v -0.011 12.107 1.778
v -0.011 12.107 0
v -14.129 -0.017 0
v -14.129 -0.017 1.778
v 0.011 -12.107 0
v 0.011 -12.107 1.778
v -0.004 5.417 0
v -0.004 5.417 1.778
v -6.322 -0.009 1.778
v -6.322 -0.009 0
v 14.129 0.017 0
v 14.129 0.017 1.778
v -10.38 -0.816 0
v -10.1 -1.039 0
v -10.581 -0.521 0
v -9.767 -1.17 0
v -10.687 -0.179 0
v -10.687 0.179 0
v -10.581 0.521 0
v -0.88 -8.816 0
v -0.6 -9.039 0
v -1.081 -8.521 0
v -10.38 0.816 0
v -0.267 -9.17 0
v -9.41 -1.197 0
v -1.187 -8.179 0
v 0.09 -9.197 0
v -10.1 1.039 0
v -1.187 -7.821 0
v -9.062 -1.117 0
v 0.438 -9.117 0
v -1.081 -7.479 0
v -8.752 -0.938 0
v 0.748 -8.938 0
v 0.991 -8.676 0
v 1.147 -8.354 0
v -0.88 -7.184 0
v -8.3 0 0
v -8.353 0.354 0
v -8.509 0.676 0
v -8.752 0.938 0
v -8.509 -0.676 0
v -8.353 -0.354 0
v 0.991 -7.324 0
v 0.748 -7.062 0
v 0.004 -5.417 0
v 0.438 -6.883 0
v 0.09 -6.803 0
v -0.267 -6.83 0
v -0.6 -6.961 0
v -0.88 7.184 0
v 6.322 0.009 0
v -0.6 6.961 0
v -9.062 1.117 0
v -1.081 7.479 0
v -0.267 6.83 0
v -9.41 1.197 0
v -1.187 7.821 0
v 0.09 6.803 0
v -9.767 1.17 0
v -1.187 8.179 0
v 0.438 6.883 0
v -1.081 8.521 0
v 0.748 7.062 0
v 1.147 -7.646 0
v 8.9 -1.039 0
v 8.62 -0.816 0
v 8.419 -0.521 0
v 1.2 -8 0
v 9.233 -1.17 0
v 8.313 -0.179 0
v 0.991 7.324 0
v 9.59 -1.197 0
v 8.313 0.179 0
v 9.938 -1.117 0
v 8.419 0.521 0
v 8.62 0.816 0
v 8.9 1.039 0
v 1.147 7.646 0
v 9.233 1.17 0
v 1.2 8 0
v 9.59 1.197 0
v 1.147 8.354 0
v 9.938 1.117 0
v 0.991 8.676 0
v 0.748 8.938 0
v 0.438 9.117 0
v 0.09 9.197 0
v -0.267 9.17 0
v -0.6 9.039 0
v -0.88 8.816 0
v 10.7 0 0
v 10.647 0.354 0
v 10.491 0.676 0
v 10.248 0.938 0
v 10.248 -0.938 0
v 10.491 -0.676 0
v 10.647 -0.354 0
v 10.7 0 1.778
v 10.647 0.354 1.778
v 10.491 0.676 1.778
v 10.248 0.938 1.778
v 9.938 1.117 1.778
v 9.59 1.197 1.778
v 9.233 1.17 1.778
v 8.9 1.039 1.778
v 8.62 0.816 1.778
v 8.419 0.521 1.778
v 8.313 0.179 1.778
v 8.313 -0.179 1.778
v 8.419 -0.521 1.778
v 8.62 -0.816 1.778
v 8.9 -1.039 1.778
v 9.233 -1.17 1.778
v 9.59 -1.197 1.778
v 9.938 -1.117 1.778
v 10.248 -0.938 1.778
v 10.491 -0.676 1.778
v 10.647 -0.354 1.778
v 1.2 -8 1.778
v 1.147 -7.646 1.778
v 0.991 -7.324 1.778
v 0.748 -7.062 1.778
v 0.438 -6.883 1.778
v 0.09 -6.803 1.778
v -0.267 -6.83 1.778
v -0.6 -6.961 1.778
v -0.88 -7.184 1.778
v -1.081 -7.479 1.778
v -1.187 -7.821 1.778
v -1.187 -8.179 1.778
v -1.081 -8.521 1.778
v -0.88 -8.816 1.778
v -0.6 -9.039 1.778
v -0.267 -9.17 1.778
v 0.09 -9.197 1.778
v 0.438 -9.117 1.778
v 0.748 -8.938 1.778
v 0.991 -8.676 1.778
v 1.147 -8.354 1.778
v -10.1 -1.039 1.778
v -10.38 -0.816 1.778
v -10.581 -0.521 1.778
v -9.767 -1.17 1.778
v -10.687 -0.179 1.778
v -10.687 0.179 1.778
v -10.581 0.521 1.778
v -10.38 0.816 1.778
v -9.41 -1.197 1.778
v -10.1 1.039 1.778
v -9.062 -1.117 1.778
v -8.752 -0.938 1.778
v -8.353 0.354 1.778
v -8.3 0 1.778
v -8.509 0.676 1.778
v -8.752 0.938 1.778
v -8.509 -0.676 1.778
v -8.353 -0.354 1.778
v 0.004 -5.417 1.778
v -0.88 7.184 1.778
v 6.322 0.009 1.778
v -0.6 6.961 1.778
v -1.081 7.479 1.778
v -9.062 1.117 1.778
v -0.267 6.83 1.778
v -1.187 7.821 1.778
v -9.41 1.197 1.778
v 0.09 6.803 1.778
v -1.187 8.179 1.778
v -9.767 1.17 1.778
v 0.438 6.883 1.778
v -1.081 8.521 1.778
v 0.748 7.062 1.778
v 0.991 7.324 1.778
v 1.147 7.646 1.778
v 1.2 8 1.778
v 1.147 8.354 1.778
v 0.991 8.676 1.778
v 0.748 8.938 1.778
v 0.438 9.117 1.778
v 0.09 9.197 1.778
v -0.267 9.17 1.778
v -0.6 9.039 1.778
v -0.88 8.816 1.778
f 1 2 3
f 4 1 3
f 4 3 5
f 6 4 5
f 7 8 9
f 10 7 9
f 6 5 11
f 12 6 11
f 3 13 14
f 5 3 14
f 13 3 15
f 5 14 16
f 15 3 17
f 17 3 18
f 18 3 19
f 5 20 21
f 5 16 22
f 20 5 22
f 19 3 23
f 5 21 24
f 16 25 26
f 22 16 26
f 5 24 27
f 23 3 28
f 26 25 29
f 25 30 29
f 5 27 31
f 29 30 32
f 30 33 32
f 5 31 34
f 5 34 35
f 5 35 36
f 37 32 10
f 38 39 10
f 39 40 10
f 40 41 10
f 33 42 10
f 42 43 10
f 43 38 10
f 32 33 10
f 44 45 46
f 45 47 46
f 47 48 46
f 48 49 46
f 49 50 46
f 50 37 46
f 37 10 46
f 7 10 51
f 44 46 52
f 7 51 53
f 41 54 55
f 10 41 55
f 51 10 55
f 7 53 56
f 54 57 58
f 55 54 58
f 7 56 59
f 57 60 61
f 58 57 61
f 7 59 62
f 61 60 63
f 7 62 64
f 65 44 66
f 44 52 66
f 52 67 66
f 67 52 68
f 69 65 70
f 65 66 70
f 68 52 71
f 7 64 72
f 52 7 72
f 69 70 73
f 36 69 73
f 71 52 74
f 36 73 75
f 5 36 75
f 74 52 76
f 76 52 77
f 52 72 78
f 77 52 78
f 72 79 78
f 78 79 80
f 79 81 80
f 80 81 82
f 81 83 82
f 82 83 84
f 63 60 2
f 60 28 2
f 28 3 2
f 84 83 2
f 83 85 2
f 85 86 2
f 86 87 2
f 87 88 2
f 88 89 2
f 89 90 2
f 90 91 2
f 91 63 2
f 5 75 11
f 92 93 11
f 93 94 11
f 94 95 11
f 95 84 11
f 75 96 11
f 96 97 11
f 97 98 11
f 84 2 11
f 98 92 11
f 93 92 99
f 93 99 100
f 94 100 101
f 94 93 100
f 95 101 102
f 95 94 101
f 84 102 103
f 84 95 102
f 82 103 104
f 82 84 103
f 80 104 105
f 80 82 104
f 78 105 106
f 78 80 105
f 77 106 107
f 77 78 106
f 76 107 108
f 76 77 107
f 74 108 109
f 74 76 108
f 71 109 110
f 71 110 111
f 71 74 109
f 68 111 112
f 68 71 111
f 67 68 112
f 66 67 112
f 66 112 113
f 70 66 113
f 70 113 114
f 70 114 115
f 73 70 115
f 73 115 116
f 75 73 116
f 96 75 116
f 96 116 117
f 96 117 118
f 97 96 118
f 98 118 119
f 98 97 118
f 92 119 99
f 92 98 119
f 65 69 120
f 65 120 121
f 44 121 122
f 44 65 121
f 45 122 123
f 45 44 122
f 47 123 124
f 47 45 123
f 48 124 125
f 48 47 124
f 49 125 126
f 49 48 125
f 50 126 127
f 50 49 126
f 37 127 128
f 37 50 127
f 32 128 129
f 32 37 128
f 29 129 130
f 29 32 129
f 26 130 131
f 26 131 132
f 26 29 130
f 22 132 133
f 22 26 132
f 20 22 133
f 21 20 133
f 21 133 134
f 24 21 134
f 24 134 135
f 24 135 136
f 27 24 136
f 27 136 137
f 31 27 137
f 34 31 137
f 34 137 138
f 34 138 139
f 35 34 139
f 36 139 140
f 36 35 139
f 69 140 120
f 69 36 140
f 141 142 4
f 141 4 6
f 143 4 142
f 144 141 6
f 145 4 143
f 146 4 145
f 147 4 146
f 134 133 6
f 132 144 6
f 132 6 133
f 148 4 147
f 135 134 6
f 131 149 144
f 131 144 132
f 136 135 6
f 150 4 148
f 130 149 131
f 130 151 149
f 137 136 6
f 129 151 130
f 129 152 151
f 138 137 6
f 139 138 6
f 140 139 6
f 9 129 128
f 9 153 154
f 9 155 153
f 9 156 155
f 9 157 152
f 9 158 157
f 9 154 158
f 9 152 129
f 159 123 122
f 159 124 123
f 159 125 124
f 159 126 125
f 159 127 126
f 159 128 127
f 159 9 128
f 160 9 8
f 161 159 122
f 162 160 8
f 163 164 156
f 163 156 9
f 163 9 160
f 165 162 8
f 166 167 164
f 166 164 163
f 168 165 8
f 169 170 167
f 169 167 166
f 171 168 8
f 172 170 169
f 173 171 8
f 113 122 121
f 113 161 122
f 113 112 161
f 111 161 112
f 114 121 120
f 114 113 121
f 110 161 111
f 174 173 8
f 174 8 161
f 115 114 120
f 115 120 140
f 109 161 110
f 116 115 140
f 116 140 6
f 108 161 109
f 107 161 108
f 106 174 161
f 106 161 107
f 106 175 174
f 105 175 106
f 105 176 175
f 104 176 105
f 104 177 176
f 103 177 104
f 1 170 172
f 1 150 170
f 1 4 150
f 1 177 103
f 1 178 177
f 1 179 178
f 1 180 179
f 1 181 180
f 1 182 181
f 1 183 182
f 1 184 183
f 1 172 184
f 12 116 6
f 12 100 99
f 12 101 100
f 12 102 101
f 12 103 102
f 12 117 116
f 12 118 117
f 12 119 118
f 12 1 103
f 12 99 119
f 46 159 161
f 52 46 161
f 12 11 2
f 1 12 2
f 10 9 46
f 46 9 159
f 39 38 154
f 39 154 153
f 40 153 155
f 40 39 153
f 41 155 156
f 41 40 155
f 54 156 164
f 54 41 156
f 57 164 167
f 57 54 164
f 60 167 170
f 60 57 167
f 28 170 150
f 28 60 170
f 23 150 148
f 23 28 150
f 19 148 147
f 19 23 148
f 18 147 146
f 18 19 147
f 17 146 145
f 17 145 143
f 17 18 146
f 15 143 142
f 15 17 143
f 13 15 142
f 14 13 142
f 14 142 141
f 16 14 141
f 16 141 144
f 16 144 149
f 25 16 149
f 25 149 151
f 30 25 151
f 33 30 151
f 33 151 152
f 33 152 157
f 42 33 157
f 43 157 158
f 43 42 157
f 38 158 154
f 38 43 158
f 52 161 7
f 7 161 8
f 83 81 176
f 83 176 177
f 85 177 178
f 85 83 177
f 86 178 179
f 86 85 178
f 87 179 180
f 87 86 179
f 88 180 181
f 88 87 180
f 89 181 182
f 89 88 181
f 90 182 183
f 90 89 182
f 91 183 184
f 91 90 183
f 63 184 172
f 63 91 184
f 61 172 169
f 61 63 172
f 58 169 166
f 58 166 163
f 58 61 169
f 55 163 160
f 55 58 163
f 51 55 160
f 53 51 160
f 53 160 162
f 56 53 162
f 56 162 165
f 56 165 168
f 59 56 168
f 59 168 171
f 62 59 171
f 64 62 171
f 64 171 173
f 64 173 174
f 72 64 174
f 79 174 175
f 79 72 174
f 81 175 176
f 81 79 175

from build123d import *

# Parameters (mm, degrees)
SKETCH1_R           = 1.2
BOSS_EXTRUDE1_DEPTH = 1.778
CUT_EXTRUDE1_REACH  = 20.691


with BuildPart() as part:
    # Sketch1 → Boss-Extrude1 (new body)
    with BuildSketch(Plane.XY):
        Polygon((-14.129156365, -0.016893901), (0.010881059, -12.106513676), (14.129156365, 0.016893901), (-0.010881059, 12.106513676), align=None)
        with Locations((0, 8)):
            Circle(SKETCH1_R, mode=Mode.SUBTRACT)
        with Locations((-9.5, 0)):
            Circle(SKETCH1_R, mode=Mode.SUBTRACT)
        with Locations((9.5, 0)):
            Circle(SKETCH1_R, mode=Mode.SUBTRACT)
        with Locations((0, -8)):
            Circle(SKETCH1_R, mode=Mode.SUBTRACT)
    extrude(amount=BOSS_EXTRUDE1_DEPTH)

    # Sketch2 → Cut-Extrude1 (cut, up to next)
    with BuildSketch(Plane.XY.offset(1.778), mode=Mode.PRIVATE) as cut_extrude1_sk1:
        Polygon((-0.003723131, 5.416744003), (-6.321720276, -0.008540092), (0.003723131, -5.416744003), (6.321720276, 0.008540092), align=None)
    cut_extrude1_tool1 = extrude(cut_extrude1_sk1.sketch, amount=-CUT_EXTRUDE1_REACH, mode=Mode.PRIVATE) & part.part
    add(cut_extrude1_tool1.solids().sort_by_distance((0, 0, 1.778))[0], mode=Mode.SUBTRACT)


solid = part.part
